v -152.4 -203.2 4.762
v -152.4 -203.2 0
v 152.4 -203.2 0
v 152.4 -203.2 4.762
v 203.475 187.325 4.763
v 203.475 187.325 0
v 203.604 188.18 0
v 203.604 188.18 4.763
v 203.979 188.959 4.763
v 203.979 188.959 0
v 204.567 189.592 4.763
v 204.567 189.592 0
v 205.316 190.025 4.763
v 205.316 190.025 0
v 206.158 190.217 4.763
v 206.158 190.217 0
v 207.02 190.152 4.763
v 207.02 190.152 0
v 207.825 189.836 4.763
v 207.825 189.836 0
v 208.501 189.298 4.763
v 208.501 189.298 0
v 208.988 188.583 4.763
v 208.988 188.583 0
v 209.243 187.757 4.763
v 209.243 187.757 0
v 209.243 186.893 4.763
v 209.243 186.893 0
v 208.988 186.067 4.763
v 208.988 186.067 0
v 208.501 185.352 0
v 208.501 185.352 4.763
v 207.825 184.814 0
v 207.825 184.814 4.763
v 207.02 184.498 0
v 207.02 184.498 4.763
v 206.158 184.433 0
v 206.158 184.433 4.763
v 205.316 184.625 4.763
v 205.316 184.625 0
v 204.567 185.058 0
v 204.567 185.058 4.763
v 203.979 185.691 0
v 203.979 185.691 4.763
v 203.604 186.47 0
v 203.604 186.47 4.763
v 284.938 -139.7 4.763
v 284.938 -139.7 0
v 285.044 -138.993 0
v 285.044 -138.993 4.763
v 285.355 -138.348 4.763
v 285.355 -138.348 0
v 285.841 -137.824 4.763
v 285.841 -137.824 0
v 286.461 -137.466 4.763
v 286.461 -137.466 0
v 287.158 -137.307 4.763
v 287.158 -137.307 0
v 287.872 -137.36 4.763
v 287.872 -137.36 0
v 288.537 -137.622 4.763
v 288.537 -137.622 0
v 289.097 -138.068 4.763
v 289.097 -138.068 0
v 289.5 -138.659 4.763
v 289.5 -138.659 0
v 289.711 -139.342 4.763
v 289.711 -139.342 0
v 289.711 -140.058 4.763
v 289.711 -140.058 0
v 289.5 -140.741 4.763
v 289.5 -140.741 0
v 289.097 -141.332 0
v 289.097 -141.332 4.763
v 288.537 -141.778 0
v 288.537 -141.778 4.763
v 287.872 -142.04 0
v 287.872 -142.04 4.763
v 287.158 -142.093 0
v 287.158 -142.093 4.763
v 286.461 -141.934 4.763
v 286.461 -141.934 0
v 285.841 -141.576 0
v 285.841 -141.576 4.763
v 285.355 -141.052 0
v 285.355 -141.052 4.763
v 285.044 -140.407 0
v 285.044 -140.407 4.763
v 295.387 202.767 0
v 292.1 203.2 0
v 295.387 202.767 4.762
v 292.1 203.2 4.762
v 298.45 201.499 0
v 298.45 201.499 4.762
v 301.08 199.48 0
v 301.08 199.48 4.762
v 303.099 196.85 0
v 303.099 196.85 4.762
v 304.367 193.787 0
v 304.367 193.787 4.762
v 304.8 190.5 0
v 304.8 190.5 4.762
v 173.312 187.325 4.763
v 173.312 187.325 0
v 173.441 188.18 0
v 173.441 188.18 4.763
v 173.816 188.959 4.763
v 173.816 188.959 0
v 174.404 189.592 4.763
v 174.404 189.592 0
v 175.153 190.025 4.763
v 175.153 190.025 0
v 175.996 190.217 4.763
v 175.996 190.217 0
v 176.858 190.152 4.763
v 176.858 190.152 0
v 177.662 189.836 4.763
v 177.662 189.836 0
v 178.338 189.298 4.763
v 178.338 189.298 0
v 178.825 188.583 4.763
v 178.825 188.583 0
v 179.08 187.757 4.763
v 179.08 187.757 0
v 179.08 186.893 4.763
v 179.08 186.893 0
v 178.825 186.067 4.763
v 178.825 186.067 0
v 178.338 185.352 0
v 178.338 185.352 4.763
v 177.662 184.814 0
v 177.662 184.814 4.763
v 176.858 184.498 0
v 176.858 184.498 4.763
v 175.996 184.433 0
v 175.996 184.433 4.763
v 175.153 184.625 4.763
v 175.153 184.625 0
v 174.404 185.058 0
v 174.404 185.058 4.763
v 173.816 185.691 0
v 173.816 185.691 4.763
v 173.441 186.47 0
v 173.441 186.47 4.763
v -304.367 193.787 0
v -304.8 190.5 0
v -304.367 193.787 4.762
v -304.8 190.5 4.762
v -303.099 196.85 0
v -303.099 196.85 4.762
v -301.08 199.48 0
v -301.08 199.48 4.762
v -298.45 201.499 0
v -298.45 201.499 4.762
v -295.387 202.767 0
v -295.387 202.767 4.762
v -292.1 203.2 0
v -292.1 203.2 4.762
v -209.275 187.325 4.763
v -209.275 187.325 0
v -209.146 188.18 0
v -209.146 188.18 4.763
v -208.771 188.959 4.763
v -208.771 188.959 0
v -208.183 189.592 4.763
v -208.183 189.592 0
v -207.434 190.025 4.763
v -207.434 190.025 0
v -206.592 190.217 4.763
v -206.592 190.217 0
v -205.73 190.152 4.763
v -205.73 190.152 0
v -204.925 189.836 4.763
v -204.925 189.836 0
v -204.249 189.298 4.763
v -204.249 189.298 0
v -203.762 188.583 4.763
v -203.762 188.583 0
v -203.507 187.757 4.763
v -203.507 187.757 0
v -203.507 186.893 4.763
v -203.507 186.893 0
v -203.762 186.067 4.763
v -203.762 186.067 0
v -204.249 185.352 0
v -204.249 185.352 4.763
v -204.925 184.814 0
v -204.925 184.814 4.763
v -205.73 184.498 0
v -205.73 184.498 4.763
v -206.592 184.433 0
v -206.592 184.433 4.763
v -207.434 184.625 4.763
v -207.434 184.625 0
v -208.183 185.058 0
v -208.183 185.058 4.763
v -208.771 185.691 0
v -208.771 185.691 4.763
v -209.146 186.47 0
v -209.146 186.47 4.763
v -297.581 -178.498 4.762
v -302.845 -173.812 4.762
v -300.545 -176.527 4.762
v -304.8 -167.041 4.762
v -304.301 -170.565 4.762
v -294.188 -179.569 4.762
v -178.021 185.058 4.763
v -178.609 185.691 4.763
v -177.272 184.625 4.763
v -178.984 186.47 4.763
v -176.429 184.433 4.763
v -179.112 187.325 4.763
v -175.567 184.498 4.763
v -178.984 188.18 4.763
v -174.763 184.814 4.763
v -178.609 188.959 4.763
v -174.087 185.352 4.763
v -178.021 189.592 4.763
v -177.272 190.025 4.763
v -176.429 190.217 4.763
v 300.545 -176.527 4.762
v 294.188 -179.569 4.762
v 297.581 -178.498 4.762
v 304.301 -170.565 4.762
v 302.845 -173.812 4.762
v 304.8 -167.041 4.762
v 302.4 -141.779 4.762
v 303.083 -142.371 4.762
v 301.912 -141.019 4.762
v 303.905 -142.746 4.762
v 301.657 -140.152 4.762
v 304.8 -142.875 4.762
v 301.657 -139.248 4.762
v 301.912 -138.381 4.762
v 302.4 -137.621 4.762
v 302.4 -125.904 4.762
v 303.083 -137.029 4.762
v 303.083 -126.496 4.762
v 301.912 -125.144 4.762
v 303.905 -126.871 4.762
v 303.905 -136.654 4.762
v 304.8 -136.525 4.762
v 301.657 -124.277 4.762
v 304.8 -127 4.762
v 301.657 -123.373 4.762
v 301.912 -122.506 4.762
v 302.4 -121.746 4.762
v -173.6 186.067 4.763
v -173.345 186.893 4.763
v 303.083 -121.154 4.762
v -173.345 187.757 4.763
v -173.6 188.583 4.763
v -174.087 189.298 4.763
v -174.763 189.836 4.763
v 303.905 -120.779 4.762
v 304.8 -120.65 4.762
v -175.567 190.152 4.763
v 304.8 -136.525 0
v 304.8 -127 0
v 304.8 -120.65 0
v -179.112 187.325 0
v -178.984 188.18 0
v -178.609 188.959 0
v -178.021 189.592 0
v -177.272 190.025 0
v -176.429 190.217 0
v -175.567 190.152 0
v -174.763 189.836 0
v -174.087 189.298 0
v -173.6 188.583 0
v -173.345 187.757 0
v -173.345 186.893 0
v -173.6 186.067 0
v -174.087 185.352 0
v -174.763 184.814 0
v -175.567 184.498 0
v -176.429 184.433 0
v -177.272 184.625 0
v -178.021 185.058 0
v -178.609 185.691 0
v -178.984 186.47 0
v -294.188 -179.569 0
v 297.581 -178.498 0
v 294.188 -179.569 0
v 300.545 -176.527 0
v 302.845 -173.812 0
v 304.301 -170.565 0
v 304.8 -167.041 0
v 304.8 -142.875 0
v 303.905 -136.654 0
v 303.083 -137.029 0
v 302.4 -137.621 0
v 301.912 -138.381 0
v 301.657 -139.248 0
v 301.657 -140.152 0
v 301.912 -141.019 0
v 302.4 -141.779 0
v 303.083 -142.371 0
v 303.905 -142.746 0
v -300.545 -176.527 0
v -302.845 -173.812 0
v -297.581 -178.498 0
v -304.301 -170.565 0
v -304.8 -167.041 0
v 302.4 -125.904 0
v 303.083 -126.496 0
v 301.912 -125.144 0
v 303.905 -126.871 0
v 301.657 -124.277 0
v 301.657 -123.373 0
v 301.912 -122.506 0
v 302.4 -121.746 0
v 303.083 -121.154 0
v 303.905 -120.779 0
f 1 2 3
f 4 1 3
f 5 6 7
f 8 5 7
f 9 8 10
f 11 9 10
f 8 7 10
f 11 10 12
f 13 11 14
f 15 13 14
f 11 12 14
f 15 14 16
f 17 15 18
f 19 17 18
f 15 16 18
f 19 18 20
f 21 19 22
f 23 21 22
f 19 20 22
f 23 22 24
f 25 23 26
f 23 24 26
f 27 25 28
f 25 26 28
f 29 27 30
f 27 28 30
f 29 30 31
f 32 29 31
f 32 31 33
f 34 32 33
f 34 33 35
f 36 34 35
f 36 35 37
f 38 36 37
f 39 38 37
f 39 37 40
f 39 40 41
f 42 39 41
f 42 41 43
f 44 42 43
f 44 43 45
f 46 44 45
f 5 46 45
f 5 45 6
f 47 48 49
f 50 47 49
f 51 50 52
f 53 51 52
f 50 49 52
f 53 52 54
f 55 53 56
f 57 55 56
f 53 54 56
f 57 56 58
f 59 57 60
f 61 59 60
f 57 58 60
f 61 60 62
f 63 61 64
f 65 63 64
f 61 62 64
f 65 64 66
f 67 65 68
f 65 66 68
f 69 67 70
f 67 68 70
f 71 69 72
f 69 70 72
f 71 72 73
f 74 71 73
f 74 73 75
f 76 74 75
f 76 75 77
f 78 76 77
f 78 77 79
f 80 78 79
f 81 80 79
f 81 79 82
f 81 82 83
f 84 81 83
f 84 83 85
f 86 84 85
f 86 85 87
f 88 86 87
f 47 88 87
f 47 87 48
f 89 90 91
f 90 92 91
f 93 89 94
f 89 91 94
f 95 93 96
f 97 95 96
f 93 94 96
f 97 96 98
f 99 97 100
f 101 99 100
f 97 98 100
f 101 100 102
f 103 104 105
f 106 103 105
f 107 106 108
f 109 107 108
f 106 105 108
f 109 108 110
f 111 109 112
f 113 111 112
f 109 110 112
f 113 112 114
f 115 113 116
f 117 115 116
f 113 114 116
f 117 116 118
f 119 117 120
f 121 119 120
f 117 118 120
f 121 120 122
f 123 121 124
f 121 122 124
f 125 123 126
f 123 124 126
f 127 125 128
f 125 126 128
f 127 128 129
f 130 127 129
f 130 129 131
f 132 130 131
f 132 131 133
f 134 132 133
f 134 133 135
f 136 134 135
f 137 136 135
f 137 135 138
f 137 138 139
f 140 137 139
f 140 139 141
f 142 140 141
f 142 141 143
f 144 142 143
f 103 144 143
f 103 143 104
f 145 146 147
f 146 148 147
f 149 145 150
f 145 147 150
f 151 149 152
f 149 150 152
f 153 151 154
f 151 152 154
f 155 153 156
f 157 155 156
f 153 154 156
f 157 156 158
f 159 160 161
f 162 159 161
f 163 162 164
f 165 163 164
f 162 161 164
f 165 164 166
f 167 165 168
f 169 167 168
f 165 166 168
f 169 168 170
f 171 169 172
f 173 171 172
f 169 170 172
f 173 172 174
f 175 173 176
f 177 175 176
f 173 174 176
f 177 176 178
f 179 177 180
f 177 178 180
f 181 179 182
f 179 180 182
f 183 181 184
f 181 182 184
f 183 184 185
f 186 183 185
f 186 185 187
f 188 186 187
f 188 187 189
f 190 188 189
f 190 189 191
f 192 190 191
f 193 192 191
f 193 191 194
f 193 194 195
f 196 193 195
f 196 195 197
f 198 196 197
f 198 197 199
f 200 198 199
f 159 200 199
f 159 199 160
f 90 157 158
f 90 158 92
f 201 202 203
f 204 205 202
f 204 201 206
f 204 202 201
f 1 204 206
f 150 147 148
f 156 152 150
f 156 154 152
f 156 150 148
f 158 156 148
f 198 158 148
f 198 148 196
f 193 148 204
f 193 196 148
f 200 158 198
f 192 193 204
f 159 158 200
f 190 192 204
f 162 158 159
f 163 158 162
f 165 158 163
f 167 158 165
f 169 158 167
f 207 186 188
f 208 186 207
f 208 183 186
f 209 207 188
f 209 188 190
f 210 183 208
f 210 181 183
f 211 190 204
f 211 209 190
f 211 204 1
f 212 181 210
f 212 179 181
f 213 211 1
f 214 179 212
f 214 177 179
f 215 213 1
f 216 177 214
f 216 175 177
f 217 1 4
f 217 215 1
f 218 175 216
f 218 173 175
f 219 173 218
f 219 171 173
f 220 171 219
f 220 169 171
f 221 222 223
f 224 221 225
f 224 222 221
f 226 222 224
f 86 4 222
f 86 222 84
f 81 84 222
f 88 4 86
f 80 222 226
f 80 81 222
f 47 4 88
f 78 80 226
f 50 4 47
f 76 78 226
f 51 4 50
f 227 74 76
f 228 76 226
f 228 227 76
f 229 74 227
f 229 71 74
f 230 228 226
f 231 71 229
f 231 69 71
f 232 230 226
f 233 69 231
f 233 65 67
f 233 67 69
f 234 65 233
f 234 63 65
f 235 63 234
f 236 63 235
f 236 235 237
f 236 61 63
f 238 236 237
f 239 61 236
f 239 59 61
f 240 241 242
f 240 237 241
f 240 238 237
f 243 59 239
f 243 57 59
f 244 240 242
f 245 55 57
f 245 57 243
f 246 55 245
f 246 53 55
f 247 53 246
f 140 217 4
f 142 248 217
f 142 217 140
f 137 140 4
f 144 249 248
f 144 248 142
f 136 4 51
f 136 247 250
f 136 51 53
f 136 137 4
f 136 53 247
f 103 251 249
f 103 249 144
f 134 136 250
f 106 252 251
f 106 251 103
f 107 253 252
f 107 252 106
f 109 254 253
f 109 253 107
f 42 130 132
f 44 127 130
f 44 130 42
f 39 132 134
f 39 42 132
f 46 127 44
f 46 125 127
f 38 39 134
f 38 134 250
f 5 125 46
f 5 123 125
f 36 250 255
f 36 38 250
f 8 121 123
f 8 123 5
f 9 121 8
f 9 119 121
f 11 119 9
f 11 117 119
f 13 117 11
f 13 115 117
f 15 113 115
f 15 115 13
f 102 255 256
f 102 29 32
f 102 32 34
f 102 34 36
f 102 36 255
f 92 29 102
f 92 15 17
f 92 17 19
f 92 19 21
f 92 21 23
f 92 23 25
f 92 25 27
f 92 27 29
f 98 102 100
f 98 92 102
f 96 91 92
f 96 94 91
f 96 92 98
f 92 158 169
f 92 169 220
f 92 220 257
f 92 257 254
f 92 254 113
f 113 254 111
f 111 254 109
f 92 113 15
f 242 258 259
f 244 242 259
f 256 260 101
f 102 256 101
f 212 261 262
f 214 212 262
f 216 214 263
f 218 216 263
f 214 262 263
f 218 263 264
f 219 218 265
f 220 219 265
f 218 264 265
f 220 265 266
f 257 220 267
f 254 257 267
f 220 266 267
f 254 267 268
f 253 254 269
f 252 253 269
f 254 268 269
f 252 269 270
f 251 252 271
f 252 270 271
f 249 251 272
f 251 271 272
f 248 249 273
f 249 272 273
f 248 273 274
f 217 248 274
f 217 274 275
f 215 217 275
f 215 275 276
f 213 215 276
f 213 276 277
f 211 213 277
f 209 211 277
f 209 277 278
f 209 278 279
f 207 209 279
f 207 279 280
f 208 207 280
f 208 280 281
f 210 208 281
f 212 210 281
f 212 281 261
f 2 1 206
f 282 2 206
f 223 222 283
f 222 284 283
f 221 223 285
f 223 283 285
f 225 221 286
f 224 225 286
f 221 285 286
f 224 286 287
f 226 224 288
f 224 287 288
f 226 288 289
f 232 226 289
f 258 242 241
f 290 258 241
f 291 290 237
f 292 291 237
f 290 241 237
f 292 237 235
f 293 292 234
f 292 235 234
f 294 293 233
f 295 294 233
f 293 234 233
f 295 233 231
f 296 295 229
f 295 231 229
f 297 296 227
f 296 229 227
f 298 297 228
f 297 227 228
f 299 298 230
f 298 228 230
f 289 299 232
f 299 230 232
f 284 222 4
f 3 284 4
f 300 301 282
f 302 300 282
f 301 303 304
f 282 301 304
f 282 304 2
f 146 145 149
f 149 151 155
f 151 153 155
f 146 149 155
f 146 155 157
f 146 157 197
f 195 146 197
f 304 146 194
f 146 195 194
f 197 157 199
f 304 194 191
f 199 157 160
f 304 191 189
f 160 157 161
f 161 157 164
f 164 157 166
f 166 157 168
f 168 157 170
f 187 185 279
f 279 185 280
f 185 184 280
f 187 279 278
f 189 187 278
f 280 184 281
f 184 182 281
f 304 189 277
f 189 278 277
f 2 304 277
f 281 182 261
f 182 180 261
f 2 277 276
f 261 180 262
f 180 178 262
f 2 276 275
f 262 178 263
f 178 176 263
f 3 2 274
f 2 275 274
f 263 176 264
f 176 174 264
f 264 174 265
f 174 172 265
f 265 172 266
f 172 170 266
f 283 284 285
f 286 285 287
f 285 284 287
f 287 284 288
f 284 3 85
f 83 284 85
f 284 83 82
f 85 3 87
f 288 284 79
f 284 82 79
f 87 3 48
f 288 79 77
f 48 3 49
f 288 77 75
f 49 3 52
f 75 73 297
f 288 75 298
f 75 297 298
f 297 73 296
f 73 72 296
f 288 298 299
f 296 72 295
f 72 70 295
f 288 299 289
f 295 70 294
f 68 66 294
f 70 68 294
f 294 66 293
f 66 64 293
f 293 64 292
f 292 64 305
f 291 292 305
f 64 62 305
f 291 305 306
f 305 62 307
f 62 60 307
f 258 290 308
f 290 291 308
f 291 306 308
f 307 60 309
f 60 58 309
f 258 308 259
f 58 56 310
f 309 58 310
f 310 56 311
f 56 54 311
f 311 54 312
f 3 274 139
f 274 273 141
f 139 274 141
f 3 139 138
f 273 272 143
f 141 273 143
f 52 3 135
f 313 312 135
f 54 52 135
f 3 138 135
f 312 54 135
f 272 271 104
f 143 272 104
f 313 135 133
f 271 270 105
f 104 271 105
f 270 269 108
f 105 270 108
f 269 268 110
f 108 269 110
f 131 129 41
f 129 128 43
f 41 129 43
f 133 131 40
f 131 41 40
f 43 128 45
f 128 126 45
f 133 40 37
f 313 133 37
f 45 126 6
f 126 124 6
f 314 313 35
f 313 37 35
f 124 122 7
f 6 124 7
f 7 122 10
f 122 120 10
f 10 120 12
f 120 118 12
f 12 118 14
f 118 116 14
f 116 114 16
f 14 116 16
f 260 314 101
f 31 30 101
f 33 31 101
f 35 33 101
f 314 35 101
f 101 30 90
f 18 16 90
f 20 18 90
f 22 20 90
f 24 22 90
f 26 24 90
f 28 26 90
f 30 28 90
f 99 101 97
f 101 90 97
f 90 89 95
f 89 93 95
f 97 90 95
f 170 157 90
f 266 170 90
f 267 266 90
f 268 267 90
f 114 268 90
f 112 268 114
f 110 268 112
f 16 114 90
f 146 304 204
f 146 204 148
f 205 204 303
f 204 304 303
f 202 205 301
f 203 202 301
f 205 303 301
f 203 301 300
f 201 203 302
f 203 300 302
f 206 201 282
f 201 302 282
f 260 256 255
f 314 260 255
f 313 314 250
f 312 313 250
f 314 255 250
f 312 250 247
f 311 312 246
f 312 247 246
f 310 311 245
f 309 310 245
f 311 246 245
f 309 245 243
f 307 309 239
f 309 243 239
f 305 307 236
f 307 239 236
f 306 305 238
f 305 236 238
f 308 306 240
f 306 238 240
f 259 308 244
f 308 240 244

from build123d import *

# Parameters (mm, degrees)
F0_W     = 609.6
F0_H     = 406.4
F1_DEPTH = 4.7625
F3_DEPTH = 25.4
F5_D     = 5.8
F7_DEPTH = 25.4
F9_D     = 4.8
F10_R    = 12.7


with BuildPart() as f1:
    # F0 (on Top) → F1 (new body)
    with BuildSketch(Plane.XY):
        Rectangle(F0_W, F0_H)
    extrude(amount=F1_DEPTH)

    # F2 (on face) → F3 (cut)
    with BuildSketch(Plane.XY.offset(4.7625)):
        Polygon((-152.4, -203.2), (-304.8, -177.8), (-304.8, -203.2), align=None)
        Polygon((152.4, -203.2), (304.8, -203.2), (304.8, -177.8), align=None)
    extrude(amount=-F3_DEPTH, mode=Mode.SUBTRACT)

    # F5 (through all)
    with Locations(Plane.XY.offset(4.7625)):
        with Locations((-206.375, 187.325), (-176.2125, 187.325), (176.2125, 187.325), (206.375, 187.325)):
            Hole(F5_D / 2)

    # F6 (on face) → F7 (cut)
    with BuildSketch(Plane.XY.offset(4.7625)):
        with BuildLine():
            Line((304.8, -127), (304.8, -120.65))
            ThreePointArc((304.8, -120.65), (301.625, -123.825), (304.8, -127))
        make_face()
        with BuildLine():
            Line((304.8, -142.875), (304.8, -136.525))
            ThreePointArc((304.8, -136.525), (301.625, -139.7), (304.8, -142.875))
        make_face()
    extrude(amount=-F7_DEPTH, mode=Mode.SUBTRACT)

    # F9 (through all)
    with Locations(Plane.XY.offset(4.7625)):
        with Locations((287.3375, -139.7)):
            Hole(F9_D / 2)

    # F10
    f10_edges = [f1.edges().sort_by_distance(p)[0] for p in [
        (304.8, -177.8, 2.38125),
        (-304.8, -177.8, 2.38125),
        (304.8, 203.2, 2.38125),
        (-304.8, 203.2, 2.38125),
    ]]
    fillet(f10_edges, radius=F10_R)


solid = f1.part
